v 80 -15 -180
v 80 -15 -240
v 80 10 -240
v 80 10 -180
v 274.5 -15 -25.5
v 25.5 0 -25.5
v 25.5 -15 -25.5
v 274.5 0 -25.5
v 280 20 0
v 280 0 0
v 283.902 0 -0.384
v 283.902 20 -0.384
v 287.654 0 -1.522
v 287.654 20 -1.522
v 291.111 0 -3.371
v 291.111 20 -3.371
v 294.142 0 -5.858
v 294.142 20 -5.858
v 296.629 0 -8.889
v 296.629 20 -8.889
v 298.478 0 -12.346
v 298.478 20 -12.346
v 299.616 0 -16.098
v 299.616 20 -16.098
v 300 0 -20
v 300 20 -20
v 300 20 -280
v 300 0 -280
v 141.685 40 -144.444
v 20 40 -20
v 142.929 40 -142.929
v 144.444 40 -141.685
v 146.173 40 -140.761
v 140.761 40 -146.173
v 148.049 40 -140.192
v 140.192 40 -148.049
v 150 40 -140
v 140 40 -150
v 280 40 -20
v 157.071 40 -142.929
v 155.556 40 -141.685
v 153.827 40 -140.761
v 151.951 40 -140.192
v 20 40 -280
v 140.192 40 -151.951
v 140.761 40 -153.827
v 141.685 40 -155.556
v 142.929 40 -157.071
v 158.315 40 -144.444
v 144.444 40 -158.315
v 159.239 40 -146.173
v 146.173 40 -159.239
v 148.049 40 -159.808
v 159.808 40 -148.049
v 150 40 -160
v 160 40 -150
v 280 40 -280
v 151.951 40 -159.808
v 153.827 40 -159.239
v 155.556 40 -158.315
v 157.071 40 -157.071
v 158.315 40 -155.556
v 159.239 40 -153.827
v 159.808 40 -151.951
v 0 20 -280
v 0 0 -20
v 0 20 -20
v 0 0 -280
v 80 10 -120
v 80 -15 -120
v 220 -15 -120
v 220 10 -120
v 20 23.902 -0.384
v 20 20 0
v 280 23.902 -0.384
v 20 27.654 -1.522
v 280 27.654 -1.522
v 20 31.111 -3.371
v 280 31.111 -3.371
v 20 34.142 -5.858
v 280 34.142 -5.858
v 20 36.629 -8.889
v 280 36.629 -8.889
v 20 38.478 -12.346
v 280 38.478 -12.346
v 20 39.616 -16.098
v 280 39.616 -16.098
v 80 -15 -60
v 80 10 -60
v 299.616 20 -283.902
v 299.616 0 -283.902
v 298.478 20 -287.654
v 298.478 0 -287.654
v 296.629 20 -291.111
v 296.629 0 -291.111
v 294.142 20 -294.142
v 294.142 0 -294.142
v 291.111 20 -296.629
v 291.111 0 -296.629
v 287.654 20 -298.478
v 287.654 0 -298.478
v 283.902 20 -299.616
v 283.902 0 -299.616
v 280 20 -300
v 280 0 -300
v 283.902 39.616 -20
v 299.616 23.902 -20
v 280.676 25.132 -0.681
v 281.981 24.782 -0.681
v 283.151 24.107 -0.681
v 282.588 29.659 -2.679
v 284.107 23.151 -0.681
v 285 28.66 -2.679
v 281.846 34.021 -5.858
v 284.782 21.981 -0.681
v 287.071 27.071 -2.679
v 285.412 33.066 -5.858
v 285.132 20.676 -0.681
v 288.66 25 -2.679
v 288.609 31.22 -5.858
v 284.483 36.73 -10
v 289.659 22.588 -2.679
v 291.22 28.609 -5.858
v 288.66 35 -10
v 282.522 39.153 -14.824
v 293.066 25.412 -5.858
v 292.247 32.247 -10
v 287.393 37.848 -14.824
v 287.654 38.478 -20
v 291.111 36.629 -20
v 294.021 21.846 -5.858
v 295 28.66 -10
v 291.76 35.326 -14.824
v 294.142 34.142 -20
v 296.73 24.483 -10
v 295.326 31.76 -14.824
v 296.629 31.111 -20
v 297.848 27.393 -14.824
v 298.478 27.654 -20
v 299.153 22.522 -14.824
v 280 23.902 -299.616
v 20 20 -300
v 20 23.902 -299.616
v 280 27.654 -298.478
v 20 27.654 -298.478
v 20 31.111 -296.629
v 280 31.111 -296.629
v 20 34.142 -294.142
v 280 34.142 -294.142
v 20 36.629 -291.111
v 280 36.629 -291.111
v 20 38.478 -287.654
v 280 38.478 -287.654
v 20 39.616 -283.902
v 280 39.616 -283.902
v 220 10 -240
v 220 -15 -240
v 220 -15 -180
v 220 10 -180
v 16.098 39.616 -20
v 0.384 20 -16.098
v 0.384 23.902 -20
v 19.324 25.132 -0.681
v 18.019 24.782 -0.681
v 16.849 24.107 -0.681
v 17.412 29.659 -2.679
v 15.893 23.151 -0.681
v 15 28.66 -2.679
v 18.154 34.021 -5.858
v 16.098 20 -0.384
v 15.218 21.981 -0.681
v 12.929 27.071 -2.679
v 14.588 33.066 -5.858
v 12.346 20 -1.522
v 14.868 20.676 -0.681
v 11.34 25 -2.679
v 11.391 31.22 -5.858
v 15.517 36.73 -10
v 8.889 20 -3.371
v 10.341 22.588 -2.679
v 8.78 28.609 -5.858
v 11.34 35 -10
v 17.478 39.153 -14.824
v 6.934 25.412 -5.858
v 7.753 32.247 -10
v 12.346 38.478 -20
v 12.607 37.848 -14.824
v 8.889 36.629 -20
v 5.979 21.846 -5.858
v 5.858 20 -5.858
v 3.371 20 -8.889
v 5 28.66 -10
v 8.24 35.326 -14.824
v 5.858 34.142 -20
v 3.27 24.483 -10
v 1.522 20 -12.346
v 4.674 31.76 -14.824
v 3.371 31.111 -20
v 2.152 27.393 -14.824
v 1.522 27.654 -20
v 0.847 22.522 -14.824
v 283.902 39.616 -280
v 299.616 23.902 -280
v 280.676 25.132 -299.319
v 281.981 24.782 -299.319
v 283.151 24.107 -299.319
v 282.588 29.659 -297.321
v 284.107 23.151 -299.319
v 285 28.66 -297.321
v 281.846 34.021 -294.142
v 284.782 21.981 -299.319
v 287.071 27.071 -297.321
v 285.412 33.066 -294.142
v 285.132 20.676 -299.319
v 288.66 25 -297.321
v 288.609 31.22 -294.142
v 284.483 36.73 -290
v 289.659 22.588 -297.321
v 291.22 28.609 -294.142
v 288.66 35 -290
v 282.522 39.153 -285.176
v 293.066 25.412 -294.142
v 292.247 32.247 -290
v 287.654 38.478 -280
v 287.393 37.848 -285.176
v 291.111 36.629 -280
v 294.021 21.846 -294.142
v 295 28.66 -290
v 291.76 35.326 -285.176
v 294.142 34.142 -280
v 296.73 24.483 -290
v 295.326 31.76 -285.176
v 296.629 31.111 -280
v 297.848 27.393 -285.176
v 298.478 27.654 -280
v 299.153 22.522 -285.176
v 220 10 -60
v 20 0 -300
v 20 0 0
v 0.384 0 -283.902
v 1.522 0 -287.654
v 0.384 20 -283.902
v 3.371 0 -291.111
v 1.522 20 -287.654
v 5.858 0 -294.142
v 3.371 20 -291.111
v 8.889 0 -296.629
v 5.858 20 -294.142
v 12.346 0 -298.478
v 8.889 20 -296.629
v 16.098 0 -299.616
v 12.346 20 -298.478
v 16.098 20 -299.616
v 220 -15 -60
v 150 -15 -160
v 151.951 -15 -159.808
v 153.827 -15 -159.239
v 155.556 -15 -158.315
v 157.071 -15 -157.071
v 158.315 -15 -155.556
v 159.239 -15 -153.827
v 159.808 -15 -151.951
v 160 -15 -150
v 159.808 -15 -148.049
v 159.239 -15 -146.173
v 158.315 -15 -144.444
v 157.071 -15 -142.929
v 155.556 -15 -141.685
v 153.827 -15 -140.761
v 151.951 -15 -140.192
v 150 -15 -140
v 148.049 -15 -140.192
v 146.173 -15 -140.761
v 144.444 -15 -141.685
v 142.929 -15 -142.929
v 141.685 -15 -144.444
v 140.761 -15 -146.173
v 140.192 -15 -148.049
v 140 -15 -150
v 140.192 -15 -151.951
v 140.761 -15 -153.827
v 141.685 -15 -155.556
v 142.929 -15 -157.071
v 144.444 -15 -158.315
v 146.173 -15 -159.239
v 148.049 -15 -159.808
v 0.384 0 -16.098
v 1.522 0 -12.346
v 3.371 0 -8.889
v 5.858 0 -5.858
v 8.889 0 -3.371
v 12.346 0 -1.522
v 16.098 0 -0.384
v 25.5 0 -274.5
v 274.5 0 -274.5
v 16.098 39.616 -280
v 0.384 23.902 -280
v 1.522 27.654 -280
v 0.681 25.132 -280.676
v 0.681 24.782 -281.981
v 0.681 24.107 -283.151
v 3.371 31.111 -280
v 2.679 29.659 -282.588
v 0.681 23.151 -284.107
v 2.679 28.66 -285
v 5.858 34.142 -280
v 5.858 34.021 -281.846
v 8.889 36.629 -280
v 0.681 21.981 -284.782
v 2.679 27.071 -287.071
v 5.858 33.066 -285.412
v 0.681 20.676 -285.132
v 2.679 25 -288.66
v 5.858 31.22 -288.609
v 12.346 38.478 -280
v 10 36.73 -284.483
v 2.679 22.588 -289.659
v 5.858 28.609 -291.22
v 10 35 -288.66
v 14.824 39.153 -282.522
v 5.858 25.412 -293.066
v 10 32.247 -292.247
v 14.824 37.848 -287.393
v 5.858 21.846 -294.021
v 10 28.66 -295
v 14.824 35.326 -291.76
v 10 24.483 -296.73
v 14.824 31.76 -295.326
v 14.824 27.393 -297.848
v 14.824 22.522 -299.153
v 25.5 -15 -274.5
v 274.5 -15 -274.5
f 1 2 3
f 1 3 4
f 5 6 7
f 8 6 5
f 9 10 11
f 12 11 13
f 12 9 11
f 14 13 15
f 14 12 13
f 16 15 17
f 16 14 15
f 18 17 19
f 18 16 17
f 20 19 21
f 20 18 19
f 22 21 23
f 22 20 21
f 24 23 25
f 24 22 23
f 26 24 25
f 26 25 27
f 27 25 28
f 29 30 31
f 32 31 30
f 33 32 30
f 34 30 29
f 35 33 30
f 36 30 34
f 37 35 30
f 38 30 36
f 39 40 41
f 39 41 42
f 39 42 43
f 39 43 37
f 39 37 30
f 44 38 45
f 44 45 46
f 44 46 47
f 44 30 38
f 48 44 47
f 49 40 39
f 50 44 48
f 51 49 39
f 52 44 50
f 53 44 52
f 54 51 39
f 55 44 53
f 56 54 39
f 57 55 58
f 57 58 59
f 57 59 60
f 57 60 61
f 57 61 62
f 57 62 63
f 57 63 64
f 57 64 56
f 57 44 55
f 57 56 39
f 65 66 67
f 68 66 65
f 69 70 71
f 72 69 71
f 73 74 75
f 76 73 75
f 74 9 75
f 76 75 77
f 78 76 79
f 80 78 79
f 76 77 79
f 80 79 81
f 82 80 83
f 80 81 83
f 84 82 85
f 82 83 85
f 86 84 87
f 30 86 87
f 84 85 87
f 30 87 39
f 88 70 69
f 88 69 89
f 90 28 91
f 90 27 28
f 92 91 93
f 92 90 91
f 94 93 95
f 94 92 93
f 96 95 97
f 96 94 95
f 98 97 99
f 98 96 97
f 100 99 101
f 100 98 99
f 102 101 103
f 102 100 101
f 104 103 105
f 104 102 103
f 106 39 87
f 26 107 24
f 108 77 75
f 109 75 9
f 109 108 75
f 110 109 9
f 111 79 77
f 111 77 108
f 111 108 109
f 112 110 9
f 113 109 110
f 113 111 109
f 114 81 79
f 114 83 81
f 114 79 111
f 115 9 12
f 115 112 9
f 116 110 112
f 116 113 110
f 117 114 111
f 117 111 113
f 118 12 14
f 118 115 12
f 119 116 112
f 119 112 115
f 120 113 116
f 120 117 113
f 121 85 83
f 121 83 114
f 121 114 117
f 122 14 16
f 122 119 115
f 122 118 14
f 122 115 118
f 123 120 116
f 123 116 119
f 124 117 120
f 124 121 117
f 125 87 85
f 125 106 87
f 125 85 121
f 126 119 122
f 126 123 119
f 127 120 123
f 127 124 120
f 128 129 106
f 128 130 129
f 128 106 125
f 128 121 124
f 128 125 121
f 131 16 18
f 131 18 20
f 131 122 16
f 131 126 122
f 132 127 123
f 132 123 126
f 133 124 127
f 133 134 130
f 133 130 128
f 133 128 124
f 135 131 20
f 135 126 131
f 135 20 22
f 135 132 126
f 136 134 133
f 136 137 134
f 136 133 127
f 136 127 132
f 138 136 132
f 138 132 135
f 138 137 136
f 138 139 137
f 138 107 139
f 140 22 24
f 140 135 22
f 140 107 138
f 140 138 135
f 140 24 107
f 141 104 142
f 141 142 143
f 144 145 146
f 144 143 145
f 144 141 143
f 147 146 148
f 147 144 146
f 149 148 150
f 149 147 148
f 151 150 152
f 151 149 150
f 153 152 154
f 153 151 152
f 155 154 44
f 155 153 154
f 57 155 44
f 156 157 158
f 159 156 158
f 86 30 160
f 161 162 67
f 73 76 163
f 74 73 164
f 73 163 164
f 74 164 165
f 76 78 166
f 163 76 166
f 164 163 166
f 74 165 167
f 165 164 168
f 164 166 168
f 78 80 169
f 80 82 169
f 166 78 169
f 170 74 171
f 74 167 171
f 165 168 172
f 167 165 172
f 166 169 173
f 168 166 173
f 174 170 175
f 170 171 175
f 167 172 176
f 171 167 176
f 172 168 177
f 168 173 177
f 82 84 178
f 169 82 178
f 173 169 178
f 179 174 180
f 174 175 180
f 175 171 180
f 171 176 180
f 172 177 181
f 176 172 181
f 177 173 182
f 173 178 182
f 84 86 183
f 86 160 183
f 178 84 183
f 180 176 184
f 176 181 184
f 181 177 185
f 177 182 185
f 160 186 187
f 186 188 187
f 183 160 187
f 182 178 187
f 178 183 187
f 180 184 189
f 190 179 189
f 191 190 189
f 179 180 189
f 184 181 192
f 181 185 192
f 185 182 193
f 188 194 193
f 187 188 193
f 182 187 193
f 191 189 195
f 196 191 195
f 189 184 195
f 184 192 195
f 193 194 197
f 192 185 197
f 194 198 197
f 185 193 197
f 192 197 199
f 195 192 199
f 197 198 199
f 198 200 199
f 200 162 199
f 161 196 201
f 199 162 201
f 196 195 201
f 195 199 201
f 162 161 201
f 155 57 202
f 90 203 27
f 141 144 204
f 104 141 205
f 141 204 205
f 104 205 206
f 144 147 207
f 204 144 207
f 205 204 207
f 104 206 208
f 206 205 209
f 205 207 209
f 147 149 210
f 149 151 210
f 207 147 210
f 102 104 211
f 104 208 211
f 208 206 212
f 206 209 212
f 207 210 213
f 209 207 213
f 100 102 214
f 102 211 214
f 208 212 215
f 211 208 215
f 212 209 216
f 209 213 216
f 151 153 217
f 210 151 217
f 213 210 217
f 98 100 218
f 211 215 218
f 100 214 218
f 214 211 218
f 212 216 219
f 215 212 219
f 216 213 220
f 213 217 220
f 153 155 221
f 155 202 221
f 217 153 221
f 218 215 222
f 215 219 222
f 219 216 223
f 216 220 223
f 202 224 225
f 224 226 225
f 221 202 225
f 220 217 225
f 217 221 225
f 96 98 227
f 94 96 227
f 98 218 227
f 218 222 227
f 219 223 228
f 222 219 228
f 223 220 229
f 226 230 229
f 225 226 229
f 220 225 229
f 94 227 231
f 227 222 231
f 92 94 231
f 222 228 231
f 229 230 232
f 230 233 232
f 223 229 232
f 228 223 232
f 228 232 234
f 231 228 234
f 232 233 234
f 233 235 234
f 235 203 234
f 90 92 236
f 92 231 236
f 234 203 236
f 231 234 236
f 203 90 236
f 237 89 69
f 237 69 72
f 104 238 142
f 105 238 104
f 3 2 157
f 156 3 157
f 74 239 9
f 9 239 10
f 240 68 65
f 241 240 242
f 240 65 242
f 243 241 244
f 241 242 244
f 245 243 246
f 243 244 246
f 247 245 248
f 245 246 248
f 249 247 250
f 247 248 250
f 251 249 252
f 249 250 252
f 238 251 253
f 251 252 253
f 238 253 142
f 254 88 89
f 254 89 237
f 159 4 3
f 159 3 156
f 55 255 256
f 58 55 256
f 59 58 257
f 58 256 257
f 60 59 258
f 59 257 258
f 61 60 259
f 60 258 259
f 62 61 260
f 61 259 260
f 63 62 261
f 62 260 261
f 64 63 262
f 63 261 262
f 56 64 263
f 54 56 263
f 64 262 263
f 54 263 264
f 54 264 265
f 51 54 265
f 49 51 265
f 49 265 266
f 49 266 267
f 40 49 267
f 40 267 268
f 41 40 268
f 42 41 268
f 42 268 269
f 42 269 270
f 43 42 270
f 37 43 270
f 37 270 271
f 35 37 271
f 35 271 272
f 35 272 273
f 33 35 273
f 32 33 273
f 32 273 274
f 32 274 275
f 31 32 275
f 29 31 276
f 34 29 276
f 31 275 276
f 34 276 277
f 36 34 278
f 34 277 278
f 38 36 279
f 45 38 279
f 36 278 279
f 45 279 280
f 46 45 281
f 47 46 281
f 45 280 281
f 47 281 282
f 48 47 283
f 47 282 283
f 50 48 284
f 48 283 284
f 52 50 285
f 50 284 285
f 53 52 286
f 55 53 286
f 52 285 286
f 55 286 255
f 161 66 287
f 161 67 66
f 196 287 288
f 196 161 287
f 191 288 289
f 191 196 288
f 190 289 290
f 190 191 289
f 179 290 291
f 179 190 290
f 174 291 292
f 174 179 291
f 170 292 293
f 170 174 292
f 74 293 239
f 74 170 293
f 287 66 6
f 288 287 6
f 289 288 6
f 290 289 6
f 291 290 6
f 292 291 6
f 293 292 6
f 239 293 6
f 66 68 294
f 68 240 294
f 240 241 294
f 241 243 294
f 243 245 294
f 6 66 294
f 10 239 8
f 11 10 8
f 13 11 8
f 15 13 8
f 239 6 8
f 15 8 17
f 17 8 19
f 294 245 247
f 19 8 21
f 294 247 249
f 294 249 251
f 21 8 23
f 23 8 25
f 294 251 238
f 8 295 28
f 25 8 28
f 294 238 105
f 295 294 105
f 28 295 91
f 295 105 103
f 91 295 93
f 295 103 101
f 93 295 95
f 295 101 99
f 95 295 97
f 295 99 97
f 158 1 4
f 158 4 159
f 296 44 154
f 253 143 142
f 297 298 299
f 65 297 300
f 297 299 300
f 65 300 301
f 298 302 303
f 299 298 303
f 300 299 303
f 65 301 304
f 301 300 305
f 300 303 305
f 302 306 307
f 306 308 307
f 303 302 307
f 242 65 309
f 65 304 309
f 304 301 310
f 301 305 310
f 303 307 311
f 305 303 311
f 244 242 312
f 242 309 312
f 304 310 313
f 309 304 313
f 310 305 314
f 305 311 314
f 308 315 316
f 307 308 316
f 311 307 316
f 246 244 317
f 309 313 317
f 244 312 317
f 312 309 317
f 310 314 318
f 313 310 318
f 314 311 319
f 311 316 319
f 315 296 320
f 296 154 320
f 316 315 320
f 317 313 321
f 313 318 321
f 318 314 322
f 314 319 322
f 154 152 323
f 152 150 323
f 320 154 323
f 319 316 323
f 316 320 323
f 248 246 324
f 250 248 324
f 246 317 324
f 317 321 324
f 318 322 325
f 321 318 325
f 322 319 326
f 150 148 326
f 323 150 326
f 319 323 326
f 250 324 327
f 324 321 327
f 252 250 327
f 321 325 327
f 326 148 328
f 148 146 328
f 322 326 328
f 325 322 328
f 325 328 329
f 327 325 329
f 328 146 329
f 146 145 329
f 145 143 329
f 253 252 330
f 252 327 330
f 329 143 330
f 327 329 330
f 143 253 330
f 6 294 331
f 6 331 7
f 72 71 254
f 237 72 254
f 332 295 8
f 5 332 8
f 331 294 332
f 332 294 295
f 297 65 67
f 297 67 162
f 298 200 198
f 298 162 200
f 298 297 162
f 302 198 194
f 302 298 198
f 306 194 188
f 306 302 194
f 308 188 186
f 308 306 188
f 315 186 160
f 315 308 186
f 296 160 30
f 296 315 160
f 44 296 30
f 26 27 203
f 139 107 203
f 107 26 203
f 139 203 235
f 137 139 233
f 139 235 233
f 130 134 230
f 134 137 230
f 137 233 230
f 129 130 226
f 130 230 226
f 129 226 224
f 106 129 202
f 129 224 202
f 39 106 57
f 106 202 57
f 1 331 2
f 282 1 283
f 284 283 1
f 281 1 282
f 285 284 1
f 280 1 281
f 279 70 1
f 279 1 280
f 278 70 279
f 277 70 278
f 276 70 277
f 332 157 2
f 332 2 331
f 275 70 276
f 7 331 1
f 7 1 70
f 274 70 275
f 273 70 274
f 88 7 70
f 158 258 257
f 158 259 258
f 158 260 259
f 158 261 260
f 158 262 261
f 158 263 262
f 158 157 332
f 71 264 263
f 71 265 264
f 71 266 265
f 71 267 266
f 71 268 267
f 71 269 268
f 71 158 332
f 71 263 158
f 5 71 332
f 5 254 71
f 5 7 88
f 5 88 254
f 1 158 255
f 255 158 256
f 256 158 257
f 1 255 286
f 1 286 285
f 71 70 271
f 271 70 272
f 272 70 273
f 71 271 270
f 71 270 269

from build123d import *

# Parameters (mm, degrees)
SKETCH1_W           = 300
SKETCH1_H           = 300
BOSS_EXTRUDE1_DEPTH = 40
FILLET1_R           = 20
SKETCH2_W           = 249
SKETCH2_H           = 249
BOSS_EXTRUDE2_DEPTH = 15
SKETCH3_W           = 140
SKETCH3_H           = 60
CUT_EXTRUDE1_DEPTH  = 25
SKETCH4_R           = 10
CUT_EXTRUDE2_DEPTH  = 428.814212013


with BuildPart() as part:
    # Sketch1 → Boss-Extrude1 (new body)
    with BuildSketch(Plane(origin=(0, 0, 0), x_dir=(1, 0, 0), z_dir=(0, 1, 0))):
        with Locations((150, 150)):
            Rectangle(SKETCH1_W, SKETCH1_H)
    extrude(amount=BOSS_EXTRUDE1_DEPTH)

    # Fillet1
    fillet1_edges = [part.edges().sort_by_distance(p)[0] for p in [
        (300, 40, -150),
        (150, 40, -300),
        (0, 40, -150),
        (150, 40, 0),
        (0, 20, -300),
        (300, 20, -300),
        (300, 20, 0),
        (0, 20, 0),
    ]]
    fillet(fillet1_edges, radius=FILLET1_R)

    # Sketch2 → Boss-Extrude2 (add)
    with BuildSketch(Plane.XZ):
        with Locations((150, -150)):
            Rectangle(SKETCH2_W, SKETCH2_H)
    extrude(amount=BOSS_EXTRUDE2_DEPTH)

    # Sketch3 → Cut-Extrude1 (cut)
    with BuildSketch(Plane.XZ.offset(15)):
        with Locations((150, -90)):
            Rectangle(SKETCH3_W, SKETCH3_H)
        with Locations((150, -210)):
            Rectangle(SKETCH3_W, SKETCH3_H)
    extrude(amount=-CUT_EXTRUDE1_DEPTH, mode=Mode.SUBTRACT)

    # Sketch4 → Cut-Extrude2 (cut, through all)
    with BuildSketch(Plane(origin=(0, -15, 0), x_dir=(-1, 0, 0), z_dir=(0, -1, 0))):
        with Locations(Location((-150, 150, 0), (0, 0, 90))):
            Circle(SKETCH4_R)
    extrude(amount=-CUT_EXTRUDE2_DEPTH, mode=Mode.SUBTRACT)


solid = part.part
